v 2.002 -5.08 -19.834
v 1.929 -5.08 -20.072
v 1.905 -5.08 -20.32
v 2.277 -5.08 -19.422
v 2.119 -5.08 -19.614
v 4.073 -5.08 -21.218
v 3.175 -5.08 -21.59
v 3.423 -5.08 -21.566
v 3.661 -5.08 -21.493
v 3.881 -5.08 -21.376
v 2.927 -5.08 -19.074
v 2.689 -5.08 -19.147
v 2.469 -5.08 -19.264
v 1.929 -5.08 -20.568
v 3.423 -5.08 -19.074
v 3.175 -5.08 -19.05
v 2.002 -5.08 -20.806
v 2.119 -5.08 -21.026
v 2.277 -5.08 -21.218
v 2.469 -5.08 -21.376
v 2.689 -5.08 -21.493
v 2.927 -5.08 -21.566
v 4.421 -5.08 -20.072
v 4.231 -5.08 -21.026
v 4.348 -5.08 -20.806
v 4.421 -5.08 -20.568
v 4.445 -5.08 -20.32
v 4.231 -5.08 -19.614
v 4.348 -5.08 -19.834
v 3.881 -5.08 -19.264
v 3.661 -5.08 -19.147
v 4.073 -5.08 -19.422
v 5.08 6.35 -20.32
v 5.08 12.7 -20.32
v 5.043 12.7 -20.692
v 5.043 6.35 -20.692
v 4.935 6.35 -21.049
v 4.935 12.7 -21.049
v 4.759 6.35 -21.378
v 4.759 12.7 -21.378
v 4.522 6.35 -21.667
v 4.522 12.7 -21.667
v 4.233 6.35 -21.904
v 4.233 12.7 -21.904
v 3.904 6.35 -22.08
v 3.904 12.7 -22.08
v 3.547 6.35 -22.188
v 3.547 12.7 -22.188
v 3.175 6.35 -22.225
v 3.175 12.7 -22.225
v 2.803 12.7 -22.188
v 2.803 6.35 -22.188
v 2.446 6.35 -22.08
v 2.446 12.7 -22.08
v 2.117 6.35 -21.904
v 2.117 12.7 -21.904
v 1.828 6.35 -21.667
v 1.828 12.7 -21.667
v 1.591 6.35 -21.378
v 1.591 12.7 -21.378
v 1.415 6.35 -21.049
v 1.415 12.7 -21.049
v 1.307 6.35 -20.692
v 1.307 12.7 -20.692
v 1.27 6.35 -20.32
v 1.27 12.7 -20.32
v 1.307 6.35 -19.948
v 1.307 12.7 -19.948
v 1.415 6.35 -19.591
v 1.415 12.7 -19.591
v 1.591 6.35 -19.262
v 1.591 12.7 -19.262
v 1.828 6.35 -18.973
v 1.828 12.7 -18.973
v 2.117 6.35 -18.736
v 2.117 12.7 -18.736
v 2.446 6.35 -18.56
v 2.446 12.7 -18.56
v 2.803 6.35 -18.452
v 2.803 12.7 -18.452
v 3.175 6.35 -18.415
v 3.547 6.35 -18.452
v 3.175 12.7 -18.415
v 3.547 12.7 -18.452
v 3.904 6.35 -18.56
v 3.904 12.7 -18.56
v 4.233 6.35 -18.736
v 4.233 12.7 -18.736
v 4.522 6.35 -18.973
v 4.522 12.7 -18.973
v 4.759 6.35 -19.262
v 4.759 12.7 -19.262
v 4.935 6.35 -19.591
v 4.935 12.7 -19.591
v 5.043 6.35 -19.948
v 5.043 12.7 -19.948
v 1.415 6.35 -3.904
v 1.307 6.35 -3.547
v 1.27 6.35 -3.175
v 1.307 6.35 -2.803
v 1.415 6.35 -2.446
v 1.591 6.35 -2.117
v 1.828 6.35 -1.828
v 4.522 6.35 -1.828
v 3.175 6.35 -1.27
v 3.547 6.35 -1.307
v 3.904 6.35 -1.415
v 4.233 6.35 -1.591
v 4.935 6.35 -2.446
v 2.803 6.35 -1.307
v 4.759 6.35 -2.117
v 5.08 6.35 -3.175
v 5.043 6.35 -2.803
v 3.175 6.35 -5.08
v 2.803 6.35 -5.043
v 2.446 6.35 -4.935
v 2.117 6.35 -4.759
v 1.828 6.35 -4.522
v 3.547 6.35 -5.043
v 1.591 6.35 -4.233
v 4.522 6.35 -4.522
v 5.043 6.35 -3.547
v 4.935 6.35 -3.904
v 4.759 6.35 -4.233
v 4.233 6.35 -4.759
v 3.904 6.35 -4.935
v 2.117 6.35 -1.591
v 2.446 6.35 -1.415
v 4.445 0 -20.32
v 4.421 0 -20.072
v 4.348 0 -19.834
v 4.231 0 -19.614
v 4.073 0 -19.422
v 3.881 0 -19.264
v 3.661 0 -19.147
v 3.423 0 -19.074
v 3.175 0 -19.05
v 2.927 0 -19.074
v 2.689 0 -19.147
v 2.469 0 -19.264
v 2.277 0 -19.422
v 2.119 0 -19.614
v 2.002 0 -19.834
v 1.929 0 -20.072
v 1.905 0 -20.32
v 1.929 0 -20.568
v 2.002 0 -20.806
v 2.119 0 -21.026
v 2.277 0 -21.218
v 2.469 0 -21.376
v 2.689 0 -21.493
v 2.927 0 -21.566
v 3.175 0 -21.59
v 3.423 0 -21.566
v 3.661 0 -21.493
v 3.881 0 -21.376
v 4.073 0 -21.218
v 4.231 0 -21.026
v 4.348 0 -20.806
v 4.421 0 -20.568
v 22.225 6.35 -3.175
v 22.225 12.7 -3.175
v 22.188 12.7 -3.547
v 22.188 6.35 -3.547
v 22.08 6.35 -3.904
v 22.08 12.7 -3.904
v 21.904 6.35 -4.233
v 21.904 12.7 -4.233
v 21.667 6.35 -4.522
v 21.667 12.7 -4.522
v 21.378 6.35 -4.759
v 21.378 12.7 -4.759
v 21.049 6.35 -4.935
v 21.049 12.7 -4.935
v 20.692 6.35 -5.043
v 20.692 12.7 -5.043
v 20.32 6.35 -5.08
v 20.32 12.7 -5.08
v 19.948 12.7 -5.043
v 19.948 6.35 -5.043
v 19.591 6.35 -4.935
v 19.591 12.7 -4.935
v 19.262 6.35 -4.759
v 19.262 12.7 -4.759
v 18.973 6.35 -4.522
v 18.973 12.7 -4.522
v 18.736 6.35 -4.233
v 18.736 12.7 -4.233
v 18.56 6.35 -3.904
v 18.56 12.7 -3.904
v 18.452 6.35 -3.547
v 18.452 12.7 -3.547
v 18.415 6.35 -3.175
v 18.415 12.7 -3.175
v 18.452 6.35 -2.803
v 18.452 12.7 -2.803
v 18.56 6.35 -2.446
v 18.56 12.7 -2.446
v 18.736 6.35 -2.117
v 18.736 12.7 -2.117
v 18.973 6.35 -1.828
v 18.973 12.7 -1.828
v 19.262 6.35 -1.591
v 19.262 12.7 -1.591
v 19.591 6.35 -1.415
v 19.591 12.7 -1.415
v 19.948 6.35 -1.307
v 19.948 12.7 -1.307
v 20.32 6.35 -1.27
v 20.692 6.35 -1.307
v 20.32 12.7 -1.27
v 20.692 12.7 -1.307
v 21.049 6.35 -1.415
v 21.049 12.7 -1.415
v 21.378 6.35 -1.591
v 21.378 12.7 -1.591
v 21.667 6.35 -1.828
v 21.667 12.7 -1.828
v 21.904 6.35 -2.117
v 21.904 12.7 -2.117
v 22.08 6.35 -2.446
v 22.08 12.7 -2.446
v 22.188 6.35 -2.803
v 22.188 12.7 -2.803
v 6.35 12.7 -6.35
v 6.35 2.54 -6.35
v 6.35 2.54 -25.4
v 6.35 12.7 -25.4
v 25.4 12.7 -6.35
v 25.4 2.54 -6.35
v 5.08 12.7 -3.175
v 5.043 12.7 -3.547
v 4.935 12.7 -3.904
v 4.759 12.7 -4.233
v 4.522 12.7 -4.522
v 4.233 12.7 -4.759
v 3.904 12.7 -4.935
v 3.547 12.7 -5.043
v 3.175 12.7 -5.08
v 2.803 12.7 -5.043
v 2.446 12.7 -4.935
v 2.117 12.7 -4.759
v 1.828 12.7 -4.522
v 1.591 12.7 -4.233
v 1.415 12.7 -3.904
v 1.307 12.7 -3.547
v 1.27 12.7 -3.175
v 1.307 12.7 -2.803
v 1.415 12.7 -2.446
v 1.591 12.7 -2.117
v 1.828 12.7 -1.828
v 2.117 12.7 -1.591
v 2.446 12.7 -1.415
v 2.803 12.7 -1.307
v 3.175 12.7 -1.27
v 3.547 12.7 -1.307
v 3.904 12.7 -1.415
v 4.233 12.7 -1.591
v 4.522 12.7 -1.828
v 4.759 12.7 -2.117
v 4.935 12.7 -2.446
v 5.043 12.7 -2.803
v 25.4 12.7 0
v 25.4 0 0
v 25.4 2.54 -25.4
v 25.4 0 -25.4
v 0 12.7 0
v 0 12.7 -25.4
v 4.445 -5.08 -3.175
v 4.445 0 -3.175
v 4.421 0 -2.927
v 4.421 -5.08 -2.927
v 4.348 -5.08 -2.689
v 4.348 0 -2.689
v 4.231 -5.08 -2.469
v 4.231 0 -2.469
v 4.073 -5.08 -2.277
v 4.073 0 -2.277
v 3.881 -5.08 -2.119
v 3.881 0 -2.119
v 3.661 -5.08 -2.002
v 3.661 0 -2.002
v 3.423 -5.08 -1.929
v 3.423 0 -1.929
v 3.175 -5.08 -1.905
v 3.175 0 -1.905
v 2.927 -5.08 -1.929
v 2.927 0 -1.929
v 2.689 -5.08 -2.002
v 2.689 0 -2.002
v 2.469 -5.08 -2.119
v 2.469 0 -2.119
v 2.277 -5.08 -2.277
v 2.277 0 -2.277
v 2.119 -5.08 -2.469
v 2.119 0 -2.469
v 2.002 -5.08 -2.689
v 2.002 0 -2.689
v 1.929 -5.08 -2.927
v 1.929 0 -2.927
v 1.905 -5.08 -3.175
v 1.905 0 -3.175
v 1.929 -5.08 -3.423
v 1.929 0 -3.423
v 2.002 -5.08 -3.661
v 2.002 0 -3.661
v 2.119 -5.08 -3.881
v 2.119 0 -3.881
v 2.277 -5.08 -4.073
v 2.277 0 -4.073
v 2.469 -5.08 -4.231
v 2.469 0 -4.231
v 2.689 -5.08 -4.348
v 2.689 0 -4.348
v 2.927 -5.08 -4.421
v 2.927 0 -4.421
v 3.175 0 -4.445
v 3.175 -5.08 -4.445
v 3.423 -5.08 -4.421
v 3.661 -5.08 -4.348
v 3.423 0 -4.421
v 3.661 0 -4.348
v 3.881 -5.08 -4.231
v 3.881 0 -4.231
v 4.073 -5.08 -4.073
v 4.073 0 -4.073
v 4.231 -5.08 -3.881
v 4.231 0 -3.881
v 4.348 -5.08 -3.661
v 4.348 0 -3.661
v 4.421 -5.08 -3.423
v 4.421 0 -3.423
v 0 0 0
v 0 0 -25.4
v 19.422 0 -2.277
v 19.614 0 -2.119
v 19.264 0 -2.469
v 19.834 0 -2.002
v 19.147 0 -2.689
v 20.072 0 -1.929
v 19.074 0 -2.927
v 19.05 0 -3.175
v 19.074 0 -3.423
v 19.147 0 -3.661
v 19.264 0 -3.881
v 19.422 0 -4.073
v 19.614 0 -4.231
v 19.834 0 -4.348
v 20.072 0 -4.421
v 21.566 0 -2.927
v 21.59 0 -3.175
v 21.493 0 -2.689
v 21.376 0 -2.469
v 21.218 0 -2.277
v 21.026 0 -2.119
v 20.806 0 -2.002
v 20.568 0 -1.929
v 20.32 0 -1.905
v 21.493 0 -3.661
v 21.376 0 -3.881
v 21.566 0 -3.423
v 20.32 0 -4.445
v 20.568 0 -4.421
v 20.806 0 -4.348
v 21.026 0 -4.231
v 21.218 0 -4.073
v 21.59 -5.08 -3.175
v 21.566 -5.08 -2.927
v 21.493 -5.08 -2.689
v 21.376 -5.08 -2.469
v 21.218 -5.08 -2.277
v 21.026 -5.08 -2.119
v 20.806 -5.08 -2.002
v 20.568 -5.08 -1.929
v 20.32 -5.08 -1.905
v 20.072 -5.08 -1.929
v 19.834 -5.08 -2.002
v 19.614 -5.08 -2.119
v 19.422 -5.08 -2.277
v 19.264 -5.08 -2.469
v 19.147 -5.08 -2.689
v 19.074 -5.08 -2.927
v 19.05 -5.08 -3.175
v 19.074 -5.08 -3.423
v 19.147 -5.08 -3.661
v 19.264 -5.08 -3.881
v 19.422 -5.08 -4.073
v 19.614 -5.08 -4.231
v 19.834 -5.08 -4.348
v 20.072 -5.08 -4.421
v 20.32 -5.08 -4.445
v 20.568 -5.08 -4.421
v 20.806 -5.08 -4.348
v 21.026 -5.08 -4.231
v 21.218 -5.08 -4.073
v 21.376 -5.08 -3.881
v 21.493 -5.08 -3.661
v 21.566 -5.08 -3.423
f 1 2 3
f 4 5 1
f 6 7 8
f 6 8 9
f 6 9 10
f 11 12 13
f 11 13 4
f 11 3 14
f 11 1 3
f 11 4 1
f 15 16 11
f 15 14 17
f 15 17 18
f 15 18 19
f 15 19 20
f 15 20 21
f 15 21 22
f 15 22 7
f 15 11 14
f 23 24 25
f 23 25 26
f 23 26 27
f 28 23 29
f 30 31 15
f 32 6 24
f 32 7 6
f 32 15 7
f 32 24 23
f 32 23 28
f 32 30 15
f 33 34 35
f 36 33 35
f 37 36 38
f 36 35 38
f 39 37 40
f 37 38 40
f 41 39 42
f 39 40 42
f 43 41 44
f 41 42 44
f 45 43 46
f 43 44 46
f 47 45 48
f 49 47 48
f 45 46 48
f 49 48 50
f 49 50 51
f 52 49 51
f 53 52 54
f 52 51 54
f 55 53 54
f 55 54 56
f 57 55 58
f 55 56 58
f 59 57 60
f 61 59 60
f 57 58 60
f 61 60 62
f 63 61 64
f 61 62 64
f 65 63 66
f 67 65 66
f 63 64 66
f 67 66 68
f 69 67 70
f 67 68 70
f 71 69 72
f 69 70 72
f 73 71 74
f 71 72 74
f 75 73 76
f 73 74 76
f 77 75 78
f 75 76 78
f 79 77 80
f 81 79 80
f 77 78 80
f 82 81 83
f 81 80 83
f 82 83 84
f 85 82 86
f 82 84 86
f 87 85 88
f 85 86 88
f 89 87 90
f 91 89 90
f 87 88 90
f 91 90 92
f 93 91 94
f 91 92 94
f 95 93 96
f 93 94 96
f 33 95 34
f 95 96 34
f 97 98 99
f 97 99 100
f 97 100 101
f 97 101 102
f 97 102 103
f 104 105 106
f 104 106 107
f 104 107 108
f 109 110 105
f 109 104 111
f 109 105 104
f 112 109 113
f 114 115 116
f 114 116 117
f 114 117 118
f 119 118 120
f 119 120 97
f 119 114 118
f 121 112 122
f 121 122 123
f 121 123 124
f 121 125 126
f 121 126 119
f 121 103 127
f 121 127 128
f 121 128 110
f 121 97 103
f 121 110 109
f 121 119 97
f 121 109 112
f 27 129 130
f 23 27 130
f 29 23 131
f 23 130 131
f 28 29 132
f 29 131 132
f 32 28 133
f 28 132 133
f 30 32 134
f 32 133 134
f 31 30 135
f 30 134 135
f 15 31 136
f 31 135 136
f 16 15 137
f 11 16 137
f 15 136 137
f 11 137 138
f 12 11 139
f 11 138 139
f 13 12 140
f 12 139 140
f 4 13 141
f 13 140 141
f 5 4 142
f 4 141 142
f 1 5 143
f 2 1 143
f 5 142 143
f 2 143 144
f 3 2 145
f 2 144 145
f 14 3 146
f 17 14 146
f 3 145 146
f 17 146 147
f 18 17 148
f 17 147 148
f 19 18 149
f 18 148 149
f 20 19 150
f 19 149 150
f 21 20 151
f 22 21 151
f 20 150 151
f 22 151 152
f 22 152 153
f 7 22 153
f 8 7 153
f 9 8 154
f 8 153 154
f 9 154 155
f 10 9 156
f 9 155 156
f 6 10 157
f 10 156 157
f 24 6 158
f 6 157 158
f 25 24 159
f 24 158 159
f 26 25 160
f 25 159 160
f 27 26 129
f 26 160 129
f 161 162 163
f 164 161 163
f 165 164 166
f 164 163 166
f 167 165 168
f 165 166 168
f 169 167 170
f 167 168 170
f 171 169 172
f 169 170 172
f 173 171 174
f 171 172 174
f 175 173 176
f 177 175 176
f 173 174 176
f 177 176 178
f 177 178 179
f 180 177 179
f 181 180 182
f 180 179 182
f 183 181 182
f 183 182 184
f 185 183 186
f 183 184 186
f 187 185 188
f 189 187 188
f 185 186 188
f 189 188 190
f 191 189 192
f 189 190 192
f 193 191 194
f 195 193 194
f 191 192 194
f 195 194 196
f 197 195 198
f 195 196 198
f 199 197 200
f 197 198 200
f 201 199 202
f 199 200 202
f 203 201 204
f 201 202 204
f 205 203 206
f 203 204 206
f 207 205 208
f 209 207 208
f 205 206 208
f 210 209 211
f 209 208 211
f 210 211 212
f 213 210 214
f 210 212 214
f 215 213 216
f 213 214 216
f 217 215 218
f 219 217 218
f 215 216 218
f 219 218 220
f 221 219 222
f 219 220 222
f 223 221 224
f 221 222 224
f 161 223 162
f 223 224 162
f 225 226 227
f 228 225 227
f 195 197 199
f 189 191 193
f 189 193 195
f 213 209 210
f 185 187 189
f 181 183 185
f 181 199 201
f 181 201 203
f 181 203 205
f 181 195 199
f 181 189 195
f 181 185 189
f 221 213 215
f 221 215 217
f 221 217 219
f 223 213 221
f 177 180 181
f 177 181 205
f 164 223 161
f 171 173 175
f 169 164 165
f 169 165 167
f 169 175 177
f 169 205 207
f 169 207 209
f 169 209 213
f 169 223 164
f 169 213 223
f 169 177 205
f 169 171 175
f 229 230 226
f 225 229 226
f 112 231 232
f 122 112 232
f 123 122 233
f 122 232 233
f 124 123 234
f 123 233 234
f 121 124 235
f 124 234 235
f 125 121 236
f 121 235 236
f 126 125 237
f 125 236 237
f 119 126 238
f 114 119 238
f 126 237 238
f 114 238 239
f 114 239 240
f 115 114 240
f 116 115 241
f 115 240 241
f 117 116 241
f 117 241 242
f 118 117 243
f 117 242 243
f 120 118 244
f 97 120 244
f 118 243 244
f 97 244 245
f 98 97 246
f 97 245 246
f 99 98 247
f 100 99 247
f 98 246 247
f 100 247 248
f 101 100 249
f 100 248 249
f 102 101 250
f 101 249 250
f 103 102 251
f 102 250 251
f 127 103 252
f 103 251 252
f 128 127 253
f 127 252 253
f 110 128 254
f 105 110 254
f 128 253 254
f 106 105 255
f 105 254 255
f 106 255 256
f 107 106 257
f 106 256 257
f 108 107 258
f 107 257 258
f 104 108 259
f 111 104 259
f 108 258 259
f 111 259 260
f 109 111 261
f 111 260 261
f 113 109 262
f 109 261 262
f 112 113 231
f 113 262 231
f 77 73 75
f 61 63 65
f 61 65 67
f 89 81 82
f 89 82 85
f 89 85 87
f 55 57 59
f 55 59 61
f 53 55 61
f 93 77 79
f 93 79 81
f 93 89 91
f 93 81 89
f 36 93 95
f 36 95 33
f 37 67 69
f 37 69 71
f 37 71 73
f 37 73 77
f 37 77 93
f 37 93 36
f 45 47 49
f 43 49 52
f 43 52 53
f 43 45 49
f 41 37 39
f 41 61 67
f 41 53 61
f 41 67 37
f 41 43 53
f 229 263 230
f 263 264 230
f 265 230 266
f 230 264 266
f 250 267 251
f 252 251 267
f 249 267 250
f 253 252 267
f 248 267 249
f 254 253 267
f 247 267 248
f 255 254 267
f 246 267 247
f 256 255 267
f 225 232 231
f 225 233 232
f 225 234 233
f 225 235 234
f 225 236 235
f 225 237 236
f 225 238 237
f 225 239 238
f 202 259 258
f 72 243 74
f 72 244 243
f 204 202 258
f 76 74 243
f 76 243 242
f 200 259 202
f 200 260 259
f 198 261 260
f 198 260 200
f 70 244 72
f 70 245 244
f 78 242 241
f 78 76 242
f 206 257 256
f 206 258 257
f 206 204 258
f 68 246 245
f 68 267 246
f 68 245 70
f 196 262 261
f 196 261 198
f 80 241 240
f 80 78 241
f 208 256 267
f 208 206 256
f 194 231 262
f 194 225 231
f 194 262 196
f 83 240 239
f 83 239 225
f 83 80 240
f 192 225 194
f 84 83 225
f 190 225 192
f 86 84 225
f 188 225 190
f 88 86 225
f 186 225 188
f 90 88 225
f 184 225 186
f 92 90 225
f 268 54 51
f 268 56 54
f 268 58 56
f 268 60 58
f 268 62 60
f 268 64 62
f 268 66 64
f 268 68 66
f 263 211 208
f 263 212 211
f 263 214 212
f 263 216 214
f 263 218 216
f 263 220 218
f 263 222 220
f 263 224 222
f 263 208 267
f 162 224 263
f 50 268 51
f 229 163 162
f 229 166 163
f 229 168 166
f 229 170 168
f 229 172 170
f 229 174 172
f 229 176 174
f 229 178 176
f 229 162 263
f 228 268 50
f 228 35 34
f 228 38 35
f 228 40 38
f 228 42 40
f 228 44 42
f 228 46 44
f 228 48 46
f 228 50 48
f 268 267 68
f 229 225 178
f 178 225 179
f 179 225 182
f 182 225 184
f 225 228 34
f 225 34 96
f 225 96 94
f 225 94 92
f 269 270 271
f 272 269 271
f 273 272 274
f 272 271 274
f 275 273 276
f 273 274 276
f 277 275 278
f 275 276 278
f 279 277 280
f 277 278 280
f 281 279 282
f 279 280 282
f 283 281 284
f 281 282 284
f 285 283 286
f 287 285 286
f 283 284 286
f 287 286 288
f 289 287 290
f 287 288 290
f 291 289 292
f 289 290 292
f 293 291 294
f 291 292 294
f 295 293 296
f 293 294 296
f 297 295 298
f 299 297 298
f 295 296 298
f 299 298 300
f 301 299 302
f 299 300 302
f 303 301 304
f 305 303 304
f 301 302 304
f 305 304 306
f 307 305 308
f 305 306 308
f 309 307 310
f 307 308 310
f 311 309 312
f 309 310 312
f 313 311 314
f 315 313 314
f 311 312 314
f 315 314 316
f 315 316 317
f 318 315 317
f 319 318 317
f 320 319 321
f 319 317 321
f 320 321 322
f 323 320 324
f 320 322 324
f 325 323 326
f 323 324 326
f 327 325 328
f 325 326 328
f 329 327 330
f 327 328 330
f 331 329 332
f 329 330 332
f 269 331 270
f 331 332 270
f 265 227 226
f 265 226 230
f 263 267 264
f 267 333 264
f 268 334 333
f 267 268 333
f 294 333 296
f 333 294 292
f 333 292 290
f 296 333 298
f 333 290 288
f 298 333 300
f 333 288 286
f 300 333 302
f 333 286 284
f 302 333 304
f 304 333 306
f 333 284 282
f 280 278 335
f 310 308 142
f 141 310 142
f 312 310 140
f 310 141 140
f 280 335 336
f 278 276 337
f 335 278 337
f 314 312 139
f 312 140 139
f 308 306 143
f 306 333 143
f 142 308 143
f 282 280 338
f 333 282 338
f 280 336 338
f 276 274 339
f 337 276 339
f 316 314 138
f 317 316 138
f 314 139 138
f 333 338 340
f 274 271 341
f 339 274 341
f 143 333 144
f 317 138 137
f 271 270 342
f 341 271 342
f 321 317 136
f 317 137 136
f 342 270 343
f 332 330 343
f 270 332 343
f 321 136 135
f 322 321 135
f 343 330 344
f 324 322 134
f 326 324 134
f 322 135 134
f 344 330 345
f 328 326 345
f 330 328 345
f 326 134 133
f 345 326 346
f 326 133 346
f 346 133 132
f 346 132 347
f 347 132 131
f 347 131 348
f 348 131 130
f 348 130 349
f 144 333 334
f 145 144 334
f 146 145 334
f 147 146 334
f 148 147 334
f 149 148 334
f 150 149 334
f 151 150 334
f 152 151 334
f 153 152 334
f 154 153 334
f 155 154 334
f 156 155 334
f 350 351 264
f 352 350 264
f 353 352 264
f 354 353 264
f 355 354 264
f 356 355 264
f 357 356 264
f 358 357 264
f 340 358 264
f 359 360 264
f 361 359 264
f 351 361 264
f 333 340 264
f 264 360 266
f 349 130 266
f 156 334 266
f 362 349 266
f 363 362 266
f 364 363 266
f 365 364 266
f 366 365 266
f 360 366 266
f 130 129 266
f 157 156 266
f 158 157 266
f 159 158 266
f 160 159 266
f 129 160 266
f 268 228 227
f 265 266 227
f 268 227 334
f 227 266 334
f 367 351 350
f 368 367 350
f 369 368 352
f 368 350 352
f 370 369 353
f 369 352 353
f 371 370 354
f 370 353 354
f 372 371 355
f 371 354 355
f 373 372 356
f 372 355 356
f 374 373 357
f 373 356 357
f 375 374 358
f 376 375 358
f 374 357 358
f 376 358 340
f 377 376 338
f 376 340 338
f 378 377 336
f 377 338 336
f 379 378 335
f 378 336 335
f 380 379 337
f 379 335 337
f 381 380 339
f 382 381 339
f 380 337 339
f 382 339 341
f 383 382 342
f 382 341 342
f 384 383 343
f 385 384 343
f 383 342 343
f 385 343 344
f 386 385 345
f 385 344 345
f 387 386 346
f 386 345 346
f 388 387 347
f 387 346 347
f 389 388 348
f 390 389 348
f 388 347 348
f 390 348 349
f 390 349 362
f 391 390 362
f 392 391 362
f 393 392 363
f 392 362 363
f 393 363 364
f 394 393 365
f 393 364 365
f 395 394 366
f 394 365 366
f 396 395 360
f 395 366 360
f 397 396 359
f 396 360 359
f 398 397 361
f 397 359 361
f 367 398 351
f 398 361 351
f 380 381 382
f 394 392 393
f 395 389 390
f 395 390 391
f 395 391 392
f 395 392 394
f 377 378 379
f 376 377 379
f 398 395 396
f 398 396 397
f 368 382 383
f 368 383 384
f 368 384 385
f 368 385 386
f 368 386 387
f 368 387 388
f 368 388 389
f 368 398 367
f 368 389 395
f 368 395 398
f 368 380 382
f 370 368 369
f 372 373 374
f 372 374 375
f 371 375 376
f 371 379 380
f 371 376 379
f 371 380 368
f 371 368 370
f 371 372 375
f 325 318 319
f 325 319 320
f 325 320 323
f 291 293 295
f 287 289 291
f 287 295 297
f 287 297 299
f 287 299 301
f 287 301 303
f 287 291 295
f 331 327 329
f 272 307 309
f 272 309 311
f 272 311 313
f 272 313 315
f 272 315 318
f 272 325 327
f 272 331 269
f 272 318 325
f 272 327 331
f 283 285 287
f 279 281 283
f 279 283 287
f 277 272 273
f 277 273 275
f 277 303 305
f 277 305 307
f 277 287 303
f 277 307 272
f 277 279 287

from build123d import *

# Parameters (mm, degrees)
SKETCH1_W           = 25.4
SKETCH1_H           = 25.4
BOSS_EXTRUDE1_DEPTH = 2.54
BOSS_EXTRUDE2_DEPTH = 10.16
SKETCH3_R           = 1.905
CUT_EXTRUDE1_DEPTH  = 6.35
SKETCH4_R           = 1.27
BOSS_EXTRUDE3_DEPTH = 5.08


with BuildPart() as part:
    # Sketch1 → Boss-Extrude1 (new body)
    with BuildSketch(Plane(origin=(0, 0, 0), x_dir=(1, 0, 0), z_dir=(0, 1, 0))):
        with Locations((12.7, 12.7)):
            Rectangle(SKETCH1_W, SKETCH1_H)
    extrude(amount=BOSS_EXTRUDE1_DEPTH)

    # Sketch2 → Boss-Extrude2 (add)
    with BuildSketch(Plane(origin=(0, 2.54, 0), x_dir=(1, 0, 0), z_dir=(0, 1, 0))):
        Polygon((0, 25.4), (0, 0), (25.4, 0), (25.4, 6.35), (6.35, 6.35), (6.35, 25.4), align=None)
    extrude(amount=BOSS_EXTRUDE2_DEPTH)

    # Sketch3 → Cut-Extrude1 (cut)
    with BuildSketch(Plane(origin=(0, 12.7, 0), x_dir=(1, 0, 0), z_dir=(0, 1, 0))):
        with Locations((3.175, 20.32)):
            Circle(SKETCH3_R)
        with Locations((3.175, 3.175)):
            Circle(SKETCH3_R)
        with Locations((20.32, 3.175)):
            Circle(SKETCH3_R)
    extrude(amount=-CUT_EXTRUDE1_DEPTH, mode=Mode.SUBTRACT)

    # Sketch4 → Boss-Extrude3 (add)
    with BuildSketch(Plane.XZ):
        with Locations((3.175, -3.175)):
            Circle(SKETCH4_R)
        with Locations((20.32, -3.175)):
            Circle(SKETCH4_R)
        with Locations((3.175, -20.32)):
            Circle(SKETCH4_R)
    extrude(amount=BOSS_EXTRUDE3_DEPTH)


solid = part.part
